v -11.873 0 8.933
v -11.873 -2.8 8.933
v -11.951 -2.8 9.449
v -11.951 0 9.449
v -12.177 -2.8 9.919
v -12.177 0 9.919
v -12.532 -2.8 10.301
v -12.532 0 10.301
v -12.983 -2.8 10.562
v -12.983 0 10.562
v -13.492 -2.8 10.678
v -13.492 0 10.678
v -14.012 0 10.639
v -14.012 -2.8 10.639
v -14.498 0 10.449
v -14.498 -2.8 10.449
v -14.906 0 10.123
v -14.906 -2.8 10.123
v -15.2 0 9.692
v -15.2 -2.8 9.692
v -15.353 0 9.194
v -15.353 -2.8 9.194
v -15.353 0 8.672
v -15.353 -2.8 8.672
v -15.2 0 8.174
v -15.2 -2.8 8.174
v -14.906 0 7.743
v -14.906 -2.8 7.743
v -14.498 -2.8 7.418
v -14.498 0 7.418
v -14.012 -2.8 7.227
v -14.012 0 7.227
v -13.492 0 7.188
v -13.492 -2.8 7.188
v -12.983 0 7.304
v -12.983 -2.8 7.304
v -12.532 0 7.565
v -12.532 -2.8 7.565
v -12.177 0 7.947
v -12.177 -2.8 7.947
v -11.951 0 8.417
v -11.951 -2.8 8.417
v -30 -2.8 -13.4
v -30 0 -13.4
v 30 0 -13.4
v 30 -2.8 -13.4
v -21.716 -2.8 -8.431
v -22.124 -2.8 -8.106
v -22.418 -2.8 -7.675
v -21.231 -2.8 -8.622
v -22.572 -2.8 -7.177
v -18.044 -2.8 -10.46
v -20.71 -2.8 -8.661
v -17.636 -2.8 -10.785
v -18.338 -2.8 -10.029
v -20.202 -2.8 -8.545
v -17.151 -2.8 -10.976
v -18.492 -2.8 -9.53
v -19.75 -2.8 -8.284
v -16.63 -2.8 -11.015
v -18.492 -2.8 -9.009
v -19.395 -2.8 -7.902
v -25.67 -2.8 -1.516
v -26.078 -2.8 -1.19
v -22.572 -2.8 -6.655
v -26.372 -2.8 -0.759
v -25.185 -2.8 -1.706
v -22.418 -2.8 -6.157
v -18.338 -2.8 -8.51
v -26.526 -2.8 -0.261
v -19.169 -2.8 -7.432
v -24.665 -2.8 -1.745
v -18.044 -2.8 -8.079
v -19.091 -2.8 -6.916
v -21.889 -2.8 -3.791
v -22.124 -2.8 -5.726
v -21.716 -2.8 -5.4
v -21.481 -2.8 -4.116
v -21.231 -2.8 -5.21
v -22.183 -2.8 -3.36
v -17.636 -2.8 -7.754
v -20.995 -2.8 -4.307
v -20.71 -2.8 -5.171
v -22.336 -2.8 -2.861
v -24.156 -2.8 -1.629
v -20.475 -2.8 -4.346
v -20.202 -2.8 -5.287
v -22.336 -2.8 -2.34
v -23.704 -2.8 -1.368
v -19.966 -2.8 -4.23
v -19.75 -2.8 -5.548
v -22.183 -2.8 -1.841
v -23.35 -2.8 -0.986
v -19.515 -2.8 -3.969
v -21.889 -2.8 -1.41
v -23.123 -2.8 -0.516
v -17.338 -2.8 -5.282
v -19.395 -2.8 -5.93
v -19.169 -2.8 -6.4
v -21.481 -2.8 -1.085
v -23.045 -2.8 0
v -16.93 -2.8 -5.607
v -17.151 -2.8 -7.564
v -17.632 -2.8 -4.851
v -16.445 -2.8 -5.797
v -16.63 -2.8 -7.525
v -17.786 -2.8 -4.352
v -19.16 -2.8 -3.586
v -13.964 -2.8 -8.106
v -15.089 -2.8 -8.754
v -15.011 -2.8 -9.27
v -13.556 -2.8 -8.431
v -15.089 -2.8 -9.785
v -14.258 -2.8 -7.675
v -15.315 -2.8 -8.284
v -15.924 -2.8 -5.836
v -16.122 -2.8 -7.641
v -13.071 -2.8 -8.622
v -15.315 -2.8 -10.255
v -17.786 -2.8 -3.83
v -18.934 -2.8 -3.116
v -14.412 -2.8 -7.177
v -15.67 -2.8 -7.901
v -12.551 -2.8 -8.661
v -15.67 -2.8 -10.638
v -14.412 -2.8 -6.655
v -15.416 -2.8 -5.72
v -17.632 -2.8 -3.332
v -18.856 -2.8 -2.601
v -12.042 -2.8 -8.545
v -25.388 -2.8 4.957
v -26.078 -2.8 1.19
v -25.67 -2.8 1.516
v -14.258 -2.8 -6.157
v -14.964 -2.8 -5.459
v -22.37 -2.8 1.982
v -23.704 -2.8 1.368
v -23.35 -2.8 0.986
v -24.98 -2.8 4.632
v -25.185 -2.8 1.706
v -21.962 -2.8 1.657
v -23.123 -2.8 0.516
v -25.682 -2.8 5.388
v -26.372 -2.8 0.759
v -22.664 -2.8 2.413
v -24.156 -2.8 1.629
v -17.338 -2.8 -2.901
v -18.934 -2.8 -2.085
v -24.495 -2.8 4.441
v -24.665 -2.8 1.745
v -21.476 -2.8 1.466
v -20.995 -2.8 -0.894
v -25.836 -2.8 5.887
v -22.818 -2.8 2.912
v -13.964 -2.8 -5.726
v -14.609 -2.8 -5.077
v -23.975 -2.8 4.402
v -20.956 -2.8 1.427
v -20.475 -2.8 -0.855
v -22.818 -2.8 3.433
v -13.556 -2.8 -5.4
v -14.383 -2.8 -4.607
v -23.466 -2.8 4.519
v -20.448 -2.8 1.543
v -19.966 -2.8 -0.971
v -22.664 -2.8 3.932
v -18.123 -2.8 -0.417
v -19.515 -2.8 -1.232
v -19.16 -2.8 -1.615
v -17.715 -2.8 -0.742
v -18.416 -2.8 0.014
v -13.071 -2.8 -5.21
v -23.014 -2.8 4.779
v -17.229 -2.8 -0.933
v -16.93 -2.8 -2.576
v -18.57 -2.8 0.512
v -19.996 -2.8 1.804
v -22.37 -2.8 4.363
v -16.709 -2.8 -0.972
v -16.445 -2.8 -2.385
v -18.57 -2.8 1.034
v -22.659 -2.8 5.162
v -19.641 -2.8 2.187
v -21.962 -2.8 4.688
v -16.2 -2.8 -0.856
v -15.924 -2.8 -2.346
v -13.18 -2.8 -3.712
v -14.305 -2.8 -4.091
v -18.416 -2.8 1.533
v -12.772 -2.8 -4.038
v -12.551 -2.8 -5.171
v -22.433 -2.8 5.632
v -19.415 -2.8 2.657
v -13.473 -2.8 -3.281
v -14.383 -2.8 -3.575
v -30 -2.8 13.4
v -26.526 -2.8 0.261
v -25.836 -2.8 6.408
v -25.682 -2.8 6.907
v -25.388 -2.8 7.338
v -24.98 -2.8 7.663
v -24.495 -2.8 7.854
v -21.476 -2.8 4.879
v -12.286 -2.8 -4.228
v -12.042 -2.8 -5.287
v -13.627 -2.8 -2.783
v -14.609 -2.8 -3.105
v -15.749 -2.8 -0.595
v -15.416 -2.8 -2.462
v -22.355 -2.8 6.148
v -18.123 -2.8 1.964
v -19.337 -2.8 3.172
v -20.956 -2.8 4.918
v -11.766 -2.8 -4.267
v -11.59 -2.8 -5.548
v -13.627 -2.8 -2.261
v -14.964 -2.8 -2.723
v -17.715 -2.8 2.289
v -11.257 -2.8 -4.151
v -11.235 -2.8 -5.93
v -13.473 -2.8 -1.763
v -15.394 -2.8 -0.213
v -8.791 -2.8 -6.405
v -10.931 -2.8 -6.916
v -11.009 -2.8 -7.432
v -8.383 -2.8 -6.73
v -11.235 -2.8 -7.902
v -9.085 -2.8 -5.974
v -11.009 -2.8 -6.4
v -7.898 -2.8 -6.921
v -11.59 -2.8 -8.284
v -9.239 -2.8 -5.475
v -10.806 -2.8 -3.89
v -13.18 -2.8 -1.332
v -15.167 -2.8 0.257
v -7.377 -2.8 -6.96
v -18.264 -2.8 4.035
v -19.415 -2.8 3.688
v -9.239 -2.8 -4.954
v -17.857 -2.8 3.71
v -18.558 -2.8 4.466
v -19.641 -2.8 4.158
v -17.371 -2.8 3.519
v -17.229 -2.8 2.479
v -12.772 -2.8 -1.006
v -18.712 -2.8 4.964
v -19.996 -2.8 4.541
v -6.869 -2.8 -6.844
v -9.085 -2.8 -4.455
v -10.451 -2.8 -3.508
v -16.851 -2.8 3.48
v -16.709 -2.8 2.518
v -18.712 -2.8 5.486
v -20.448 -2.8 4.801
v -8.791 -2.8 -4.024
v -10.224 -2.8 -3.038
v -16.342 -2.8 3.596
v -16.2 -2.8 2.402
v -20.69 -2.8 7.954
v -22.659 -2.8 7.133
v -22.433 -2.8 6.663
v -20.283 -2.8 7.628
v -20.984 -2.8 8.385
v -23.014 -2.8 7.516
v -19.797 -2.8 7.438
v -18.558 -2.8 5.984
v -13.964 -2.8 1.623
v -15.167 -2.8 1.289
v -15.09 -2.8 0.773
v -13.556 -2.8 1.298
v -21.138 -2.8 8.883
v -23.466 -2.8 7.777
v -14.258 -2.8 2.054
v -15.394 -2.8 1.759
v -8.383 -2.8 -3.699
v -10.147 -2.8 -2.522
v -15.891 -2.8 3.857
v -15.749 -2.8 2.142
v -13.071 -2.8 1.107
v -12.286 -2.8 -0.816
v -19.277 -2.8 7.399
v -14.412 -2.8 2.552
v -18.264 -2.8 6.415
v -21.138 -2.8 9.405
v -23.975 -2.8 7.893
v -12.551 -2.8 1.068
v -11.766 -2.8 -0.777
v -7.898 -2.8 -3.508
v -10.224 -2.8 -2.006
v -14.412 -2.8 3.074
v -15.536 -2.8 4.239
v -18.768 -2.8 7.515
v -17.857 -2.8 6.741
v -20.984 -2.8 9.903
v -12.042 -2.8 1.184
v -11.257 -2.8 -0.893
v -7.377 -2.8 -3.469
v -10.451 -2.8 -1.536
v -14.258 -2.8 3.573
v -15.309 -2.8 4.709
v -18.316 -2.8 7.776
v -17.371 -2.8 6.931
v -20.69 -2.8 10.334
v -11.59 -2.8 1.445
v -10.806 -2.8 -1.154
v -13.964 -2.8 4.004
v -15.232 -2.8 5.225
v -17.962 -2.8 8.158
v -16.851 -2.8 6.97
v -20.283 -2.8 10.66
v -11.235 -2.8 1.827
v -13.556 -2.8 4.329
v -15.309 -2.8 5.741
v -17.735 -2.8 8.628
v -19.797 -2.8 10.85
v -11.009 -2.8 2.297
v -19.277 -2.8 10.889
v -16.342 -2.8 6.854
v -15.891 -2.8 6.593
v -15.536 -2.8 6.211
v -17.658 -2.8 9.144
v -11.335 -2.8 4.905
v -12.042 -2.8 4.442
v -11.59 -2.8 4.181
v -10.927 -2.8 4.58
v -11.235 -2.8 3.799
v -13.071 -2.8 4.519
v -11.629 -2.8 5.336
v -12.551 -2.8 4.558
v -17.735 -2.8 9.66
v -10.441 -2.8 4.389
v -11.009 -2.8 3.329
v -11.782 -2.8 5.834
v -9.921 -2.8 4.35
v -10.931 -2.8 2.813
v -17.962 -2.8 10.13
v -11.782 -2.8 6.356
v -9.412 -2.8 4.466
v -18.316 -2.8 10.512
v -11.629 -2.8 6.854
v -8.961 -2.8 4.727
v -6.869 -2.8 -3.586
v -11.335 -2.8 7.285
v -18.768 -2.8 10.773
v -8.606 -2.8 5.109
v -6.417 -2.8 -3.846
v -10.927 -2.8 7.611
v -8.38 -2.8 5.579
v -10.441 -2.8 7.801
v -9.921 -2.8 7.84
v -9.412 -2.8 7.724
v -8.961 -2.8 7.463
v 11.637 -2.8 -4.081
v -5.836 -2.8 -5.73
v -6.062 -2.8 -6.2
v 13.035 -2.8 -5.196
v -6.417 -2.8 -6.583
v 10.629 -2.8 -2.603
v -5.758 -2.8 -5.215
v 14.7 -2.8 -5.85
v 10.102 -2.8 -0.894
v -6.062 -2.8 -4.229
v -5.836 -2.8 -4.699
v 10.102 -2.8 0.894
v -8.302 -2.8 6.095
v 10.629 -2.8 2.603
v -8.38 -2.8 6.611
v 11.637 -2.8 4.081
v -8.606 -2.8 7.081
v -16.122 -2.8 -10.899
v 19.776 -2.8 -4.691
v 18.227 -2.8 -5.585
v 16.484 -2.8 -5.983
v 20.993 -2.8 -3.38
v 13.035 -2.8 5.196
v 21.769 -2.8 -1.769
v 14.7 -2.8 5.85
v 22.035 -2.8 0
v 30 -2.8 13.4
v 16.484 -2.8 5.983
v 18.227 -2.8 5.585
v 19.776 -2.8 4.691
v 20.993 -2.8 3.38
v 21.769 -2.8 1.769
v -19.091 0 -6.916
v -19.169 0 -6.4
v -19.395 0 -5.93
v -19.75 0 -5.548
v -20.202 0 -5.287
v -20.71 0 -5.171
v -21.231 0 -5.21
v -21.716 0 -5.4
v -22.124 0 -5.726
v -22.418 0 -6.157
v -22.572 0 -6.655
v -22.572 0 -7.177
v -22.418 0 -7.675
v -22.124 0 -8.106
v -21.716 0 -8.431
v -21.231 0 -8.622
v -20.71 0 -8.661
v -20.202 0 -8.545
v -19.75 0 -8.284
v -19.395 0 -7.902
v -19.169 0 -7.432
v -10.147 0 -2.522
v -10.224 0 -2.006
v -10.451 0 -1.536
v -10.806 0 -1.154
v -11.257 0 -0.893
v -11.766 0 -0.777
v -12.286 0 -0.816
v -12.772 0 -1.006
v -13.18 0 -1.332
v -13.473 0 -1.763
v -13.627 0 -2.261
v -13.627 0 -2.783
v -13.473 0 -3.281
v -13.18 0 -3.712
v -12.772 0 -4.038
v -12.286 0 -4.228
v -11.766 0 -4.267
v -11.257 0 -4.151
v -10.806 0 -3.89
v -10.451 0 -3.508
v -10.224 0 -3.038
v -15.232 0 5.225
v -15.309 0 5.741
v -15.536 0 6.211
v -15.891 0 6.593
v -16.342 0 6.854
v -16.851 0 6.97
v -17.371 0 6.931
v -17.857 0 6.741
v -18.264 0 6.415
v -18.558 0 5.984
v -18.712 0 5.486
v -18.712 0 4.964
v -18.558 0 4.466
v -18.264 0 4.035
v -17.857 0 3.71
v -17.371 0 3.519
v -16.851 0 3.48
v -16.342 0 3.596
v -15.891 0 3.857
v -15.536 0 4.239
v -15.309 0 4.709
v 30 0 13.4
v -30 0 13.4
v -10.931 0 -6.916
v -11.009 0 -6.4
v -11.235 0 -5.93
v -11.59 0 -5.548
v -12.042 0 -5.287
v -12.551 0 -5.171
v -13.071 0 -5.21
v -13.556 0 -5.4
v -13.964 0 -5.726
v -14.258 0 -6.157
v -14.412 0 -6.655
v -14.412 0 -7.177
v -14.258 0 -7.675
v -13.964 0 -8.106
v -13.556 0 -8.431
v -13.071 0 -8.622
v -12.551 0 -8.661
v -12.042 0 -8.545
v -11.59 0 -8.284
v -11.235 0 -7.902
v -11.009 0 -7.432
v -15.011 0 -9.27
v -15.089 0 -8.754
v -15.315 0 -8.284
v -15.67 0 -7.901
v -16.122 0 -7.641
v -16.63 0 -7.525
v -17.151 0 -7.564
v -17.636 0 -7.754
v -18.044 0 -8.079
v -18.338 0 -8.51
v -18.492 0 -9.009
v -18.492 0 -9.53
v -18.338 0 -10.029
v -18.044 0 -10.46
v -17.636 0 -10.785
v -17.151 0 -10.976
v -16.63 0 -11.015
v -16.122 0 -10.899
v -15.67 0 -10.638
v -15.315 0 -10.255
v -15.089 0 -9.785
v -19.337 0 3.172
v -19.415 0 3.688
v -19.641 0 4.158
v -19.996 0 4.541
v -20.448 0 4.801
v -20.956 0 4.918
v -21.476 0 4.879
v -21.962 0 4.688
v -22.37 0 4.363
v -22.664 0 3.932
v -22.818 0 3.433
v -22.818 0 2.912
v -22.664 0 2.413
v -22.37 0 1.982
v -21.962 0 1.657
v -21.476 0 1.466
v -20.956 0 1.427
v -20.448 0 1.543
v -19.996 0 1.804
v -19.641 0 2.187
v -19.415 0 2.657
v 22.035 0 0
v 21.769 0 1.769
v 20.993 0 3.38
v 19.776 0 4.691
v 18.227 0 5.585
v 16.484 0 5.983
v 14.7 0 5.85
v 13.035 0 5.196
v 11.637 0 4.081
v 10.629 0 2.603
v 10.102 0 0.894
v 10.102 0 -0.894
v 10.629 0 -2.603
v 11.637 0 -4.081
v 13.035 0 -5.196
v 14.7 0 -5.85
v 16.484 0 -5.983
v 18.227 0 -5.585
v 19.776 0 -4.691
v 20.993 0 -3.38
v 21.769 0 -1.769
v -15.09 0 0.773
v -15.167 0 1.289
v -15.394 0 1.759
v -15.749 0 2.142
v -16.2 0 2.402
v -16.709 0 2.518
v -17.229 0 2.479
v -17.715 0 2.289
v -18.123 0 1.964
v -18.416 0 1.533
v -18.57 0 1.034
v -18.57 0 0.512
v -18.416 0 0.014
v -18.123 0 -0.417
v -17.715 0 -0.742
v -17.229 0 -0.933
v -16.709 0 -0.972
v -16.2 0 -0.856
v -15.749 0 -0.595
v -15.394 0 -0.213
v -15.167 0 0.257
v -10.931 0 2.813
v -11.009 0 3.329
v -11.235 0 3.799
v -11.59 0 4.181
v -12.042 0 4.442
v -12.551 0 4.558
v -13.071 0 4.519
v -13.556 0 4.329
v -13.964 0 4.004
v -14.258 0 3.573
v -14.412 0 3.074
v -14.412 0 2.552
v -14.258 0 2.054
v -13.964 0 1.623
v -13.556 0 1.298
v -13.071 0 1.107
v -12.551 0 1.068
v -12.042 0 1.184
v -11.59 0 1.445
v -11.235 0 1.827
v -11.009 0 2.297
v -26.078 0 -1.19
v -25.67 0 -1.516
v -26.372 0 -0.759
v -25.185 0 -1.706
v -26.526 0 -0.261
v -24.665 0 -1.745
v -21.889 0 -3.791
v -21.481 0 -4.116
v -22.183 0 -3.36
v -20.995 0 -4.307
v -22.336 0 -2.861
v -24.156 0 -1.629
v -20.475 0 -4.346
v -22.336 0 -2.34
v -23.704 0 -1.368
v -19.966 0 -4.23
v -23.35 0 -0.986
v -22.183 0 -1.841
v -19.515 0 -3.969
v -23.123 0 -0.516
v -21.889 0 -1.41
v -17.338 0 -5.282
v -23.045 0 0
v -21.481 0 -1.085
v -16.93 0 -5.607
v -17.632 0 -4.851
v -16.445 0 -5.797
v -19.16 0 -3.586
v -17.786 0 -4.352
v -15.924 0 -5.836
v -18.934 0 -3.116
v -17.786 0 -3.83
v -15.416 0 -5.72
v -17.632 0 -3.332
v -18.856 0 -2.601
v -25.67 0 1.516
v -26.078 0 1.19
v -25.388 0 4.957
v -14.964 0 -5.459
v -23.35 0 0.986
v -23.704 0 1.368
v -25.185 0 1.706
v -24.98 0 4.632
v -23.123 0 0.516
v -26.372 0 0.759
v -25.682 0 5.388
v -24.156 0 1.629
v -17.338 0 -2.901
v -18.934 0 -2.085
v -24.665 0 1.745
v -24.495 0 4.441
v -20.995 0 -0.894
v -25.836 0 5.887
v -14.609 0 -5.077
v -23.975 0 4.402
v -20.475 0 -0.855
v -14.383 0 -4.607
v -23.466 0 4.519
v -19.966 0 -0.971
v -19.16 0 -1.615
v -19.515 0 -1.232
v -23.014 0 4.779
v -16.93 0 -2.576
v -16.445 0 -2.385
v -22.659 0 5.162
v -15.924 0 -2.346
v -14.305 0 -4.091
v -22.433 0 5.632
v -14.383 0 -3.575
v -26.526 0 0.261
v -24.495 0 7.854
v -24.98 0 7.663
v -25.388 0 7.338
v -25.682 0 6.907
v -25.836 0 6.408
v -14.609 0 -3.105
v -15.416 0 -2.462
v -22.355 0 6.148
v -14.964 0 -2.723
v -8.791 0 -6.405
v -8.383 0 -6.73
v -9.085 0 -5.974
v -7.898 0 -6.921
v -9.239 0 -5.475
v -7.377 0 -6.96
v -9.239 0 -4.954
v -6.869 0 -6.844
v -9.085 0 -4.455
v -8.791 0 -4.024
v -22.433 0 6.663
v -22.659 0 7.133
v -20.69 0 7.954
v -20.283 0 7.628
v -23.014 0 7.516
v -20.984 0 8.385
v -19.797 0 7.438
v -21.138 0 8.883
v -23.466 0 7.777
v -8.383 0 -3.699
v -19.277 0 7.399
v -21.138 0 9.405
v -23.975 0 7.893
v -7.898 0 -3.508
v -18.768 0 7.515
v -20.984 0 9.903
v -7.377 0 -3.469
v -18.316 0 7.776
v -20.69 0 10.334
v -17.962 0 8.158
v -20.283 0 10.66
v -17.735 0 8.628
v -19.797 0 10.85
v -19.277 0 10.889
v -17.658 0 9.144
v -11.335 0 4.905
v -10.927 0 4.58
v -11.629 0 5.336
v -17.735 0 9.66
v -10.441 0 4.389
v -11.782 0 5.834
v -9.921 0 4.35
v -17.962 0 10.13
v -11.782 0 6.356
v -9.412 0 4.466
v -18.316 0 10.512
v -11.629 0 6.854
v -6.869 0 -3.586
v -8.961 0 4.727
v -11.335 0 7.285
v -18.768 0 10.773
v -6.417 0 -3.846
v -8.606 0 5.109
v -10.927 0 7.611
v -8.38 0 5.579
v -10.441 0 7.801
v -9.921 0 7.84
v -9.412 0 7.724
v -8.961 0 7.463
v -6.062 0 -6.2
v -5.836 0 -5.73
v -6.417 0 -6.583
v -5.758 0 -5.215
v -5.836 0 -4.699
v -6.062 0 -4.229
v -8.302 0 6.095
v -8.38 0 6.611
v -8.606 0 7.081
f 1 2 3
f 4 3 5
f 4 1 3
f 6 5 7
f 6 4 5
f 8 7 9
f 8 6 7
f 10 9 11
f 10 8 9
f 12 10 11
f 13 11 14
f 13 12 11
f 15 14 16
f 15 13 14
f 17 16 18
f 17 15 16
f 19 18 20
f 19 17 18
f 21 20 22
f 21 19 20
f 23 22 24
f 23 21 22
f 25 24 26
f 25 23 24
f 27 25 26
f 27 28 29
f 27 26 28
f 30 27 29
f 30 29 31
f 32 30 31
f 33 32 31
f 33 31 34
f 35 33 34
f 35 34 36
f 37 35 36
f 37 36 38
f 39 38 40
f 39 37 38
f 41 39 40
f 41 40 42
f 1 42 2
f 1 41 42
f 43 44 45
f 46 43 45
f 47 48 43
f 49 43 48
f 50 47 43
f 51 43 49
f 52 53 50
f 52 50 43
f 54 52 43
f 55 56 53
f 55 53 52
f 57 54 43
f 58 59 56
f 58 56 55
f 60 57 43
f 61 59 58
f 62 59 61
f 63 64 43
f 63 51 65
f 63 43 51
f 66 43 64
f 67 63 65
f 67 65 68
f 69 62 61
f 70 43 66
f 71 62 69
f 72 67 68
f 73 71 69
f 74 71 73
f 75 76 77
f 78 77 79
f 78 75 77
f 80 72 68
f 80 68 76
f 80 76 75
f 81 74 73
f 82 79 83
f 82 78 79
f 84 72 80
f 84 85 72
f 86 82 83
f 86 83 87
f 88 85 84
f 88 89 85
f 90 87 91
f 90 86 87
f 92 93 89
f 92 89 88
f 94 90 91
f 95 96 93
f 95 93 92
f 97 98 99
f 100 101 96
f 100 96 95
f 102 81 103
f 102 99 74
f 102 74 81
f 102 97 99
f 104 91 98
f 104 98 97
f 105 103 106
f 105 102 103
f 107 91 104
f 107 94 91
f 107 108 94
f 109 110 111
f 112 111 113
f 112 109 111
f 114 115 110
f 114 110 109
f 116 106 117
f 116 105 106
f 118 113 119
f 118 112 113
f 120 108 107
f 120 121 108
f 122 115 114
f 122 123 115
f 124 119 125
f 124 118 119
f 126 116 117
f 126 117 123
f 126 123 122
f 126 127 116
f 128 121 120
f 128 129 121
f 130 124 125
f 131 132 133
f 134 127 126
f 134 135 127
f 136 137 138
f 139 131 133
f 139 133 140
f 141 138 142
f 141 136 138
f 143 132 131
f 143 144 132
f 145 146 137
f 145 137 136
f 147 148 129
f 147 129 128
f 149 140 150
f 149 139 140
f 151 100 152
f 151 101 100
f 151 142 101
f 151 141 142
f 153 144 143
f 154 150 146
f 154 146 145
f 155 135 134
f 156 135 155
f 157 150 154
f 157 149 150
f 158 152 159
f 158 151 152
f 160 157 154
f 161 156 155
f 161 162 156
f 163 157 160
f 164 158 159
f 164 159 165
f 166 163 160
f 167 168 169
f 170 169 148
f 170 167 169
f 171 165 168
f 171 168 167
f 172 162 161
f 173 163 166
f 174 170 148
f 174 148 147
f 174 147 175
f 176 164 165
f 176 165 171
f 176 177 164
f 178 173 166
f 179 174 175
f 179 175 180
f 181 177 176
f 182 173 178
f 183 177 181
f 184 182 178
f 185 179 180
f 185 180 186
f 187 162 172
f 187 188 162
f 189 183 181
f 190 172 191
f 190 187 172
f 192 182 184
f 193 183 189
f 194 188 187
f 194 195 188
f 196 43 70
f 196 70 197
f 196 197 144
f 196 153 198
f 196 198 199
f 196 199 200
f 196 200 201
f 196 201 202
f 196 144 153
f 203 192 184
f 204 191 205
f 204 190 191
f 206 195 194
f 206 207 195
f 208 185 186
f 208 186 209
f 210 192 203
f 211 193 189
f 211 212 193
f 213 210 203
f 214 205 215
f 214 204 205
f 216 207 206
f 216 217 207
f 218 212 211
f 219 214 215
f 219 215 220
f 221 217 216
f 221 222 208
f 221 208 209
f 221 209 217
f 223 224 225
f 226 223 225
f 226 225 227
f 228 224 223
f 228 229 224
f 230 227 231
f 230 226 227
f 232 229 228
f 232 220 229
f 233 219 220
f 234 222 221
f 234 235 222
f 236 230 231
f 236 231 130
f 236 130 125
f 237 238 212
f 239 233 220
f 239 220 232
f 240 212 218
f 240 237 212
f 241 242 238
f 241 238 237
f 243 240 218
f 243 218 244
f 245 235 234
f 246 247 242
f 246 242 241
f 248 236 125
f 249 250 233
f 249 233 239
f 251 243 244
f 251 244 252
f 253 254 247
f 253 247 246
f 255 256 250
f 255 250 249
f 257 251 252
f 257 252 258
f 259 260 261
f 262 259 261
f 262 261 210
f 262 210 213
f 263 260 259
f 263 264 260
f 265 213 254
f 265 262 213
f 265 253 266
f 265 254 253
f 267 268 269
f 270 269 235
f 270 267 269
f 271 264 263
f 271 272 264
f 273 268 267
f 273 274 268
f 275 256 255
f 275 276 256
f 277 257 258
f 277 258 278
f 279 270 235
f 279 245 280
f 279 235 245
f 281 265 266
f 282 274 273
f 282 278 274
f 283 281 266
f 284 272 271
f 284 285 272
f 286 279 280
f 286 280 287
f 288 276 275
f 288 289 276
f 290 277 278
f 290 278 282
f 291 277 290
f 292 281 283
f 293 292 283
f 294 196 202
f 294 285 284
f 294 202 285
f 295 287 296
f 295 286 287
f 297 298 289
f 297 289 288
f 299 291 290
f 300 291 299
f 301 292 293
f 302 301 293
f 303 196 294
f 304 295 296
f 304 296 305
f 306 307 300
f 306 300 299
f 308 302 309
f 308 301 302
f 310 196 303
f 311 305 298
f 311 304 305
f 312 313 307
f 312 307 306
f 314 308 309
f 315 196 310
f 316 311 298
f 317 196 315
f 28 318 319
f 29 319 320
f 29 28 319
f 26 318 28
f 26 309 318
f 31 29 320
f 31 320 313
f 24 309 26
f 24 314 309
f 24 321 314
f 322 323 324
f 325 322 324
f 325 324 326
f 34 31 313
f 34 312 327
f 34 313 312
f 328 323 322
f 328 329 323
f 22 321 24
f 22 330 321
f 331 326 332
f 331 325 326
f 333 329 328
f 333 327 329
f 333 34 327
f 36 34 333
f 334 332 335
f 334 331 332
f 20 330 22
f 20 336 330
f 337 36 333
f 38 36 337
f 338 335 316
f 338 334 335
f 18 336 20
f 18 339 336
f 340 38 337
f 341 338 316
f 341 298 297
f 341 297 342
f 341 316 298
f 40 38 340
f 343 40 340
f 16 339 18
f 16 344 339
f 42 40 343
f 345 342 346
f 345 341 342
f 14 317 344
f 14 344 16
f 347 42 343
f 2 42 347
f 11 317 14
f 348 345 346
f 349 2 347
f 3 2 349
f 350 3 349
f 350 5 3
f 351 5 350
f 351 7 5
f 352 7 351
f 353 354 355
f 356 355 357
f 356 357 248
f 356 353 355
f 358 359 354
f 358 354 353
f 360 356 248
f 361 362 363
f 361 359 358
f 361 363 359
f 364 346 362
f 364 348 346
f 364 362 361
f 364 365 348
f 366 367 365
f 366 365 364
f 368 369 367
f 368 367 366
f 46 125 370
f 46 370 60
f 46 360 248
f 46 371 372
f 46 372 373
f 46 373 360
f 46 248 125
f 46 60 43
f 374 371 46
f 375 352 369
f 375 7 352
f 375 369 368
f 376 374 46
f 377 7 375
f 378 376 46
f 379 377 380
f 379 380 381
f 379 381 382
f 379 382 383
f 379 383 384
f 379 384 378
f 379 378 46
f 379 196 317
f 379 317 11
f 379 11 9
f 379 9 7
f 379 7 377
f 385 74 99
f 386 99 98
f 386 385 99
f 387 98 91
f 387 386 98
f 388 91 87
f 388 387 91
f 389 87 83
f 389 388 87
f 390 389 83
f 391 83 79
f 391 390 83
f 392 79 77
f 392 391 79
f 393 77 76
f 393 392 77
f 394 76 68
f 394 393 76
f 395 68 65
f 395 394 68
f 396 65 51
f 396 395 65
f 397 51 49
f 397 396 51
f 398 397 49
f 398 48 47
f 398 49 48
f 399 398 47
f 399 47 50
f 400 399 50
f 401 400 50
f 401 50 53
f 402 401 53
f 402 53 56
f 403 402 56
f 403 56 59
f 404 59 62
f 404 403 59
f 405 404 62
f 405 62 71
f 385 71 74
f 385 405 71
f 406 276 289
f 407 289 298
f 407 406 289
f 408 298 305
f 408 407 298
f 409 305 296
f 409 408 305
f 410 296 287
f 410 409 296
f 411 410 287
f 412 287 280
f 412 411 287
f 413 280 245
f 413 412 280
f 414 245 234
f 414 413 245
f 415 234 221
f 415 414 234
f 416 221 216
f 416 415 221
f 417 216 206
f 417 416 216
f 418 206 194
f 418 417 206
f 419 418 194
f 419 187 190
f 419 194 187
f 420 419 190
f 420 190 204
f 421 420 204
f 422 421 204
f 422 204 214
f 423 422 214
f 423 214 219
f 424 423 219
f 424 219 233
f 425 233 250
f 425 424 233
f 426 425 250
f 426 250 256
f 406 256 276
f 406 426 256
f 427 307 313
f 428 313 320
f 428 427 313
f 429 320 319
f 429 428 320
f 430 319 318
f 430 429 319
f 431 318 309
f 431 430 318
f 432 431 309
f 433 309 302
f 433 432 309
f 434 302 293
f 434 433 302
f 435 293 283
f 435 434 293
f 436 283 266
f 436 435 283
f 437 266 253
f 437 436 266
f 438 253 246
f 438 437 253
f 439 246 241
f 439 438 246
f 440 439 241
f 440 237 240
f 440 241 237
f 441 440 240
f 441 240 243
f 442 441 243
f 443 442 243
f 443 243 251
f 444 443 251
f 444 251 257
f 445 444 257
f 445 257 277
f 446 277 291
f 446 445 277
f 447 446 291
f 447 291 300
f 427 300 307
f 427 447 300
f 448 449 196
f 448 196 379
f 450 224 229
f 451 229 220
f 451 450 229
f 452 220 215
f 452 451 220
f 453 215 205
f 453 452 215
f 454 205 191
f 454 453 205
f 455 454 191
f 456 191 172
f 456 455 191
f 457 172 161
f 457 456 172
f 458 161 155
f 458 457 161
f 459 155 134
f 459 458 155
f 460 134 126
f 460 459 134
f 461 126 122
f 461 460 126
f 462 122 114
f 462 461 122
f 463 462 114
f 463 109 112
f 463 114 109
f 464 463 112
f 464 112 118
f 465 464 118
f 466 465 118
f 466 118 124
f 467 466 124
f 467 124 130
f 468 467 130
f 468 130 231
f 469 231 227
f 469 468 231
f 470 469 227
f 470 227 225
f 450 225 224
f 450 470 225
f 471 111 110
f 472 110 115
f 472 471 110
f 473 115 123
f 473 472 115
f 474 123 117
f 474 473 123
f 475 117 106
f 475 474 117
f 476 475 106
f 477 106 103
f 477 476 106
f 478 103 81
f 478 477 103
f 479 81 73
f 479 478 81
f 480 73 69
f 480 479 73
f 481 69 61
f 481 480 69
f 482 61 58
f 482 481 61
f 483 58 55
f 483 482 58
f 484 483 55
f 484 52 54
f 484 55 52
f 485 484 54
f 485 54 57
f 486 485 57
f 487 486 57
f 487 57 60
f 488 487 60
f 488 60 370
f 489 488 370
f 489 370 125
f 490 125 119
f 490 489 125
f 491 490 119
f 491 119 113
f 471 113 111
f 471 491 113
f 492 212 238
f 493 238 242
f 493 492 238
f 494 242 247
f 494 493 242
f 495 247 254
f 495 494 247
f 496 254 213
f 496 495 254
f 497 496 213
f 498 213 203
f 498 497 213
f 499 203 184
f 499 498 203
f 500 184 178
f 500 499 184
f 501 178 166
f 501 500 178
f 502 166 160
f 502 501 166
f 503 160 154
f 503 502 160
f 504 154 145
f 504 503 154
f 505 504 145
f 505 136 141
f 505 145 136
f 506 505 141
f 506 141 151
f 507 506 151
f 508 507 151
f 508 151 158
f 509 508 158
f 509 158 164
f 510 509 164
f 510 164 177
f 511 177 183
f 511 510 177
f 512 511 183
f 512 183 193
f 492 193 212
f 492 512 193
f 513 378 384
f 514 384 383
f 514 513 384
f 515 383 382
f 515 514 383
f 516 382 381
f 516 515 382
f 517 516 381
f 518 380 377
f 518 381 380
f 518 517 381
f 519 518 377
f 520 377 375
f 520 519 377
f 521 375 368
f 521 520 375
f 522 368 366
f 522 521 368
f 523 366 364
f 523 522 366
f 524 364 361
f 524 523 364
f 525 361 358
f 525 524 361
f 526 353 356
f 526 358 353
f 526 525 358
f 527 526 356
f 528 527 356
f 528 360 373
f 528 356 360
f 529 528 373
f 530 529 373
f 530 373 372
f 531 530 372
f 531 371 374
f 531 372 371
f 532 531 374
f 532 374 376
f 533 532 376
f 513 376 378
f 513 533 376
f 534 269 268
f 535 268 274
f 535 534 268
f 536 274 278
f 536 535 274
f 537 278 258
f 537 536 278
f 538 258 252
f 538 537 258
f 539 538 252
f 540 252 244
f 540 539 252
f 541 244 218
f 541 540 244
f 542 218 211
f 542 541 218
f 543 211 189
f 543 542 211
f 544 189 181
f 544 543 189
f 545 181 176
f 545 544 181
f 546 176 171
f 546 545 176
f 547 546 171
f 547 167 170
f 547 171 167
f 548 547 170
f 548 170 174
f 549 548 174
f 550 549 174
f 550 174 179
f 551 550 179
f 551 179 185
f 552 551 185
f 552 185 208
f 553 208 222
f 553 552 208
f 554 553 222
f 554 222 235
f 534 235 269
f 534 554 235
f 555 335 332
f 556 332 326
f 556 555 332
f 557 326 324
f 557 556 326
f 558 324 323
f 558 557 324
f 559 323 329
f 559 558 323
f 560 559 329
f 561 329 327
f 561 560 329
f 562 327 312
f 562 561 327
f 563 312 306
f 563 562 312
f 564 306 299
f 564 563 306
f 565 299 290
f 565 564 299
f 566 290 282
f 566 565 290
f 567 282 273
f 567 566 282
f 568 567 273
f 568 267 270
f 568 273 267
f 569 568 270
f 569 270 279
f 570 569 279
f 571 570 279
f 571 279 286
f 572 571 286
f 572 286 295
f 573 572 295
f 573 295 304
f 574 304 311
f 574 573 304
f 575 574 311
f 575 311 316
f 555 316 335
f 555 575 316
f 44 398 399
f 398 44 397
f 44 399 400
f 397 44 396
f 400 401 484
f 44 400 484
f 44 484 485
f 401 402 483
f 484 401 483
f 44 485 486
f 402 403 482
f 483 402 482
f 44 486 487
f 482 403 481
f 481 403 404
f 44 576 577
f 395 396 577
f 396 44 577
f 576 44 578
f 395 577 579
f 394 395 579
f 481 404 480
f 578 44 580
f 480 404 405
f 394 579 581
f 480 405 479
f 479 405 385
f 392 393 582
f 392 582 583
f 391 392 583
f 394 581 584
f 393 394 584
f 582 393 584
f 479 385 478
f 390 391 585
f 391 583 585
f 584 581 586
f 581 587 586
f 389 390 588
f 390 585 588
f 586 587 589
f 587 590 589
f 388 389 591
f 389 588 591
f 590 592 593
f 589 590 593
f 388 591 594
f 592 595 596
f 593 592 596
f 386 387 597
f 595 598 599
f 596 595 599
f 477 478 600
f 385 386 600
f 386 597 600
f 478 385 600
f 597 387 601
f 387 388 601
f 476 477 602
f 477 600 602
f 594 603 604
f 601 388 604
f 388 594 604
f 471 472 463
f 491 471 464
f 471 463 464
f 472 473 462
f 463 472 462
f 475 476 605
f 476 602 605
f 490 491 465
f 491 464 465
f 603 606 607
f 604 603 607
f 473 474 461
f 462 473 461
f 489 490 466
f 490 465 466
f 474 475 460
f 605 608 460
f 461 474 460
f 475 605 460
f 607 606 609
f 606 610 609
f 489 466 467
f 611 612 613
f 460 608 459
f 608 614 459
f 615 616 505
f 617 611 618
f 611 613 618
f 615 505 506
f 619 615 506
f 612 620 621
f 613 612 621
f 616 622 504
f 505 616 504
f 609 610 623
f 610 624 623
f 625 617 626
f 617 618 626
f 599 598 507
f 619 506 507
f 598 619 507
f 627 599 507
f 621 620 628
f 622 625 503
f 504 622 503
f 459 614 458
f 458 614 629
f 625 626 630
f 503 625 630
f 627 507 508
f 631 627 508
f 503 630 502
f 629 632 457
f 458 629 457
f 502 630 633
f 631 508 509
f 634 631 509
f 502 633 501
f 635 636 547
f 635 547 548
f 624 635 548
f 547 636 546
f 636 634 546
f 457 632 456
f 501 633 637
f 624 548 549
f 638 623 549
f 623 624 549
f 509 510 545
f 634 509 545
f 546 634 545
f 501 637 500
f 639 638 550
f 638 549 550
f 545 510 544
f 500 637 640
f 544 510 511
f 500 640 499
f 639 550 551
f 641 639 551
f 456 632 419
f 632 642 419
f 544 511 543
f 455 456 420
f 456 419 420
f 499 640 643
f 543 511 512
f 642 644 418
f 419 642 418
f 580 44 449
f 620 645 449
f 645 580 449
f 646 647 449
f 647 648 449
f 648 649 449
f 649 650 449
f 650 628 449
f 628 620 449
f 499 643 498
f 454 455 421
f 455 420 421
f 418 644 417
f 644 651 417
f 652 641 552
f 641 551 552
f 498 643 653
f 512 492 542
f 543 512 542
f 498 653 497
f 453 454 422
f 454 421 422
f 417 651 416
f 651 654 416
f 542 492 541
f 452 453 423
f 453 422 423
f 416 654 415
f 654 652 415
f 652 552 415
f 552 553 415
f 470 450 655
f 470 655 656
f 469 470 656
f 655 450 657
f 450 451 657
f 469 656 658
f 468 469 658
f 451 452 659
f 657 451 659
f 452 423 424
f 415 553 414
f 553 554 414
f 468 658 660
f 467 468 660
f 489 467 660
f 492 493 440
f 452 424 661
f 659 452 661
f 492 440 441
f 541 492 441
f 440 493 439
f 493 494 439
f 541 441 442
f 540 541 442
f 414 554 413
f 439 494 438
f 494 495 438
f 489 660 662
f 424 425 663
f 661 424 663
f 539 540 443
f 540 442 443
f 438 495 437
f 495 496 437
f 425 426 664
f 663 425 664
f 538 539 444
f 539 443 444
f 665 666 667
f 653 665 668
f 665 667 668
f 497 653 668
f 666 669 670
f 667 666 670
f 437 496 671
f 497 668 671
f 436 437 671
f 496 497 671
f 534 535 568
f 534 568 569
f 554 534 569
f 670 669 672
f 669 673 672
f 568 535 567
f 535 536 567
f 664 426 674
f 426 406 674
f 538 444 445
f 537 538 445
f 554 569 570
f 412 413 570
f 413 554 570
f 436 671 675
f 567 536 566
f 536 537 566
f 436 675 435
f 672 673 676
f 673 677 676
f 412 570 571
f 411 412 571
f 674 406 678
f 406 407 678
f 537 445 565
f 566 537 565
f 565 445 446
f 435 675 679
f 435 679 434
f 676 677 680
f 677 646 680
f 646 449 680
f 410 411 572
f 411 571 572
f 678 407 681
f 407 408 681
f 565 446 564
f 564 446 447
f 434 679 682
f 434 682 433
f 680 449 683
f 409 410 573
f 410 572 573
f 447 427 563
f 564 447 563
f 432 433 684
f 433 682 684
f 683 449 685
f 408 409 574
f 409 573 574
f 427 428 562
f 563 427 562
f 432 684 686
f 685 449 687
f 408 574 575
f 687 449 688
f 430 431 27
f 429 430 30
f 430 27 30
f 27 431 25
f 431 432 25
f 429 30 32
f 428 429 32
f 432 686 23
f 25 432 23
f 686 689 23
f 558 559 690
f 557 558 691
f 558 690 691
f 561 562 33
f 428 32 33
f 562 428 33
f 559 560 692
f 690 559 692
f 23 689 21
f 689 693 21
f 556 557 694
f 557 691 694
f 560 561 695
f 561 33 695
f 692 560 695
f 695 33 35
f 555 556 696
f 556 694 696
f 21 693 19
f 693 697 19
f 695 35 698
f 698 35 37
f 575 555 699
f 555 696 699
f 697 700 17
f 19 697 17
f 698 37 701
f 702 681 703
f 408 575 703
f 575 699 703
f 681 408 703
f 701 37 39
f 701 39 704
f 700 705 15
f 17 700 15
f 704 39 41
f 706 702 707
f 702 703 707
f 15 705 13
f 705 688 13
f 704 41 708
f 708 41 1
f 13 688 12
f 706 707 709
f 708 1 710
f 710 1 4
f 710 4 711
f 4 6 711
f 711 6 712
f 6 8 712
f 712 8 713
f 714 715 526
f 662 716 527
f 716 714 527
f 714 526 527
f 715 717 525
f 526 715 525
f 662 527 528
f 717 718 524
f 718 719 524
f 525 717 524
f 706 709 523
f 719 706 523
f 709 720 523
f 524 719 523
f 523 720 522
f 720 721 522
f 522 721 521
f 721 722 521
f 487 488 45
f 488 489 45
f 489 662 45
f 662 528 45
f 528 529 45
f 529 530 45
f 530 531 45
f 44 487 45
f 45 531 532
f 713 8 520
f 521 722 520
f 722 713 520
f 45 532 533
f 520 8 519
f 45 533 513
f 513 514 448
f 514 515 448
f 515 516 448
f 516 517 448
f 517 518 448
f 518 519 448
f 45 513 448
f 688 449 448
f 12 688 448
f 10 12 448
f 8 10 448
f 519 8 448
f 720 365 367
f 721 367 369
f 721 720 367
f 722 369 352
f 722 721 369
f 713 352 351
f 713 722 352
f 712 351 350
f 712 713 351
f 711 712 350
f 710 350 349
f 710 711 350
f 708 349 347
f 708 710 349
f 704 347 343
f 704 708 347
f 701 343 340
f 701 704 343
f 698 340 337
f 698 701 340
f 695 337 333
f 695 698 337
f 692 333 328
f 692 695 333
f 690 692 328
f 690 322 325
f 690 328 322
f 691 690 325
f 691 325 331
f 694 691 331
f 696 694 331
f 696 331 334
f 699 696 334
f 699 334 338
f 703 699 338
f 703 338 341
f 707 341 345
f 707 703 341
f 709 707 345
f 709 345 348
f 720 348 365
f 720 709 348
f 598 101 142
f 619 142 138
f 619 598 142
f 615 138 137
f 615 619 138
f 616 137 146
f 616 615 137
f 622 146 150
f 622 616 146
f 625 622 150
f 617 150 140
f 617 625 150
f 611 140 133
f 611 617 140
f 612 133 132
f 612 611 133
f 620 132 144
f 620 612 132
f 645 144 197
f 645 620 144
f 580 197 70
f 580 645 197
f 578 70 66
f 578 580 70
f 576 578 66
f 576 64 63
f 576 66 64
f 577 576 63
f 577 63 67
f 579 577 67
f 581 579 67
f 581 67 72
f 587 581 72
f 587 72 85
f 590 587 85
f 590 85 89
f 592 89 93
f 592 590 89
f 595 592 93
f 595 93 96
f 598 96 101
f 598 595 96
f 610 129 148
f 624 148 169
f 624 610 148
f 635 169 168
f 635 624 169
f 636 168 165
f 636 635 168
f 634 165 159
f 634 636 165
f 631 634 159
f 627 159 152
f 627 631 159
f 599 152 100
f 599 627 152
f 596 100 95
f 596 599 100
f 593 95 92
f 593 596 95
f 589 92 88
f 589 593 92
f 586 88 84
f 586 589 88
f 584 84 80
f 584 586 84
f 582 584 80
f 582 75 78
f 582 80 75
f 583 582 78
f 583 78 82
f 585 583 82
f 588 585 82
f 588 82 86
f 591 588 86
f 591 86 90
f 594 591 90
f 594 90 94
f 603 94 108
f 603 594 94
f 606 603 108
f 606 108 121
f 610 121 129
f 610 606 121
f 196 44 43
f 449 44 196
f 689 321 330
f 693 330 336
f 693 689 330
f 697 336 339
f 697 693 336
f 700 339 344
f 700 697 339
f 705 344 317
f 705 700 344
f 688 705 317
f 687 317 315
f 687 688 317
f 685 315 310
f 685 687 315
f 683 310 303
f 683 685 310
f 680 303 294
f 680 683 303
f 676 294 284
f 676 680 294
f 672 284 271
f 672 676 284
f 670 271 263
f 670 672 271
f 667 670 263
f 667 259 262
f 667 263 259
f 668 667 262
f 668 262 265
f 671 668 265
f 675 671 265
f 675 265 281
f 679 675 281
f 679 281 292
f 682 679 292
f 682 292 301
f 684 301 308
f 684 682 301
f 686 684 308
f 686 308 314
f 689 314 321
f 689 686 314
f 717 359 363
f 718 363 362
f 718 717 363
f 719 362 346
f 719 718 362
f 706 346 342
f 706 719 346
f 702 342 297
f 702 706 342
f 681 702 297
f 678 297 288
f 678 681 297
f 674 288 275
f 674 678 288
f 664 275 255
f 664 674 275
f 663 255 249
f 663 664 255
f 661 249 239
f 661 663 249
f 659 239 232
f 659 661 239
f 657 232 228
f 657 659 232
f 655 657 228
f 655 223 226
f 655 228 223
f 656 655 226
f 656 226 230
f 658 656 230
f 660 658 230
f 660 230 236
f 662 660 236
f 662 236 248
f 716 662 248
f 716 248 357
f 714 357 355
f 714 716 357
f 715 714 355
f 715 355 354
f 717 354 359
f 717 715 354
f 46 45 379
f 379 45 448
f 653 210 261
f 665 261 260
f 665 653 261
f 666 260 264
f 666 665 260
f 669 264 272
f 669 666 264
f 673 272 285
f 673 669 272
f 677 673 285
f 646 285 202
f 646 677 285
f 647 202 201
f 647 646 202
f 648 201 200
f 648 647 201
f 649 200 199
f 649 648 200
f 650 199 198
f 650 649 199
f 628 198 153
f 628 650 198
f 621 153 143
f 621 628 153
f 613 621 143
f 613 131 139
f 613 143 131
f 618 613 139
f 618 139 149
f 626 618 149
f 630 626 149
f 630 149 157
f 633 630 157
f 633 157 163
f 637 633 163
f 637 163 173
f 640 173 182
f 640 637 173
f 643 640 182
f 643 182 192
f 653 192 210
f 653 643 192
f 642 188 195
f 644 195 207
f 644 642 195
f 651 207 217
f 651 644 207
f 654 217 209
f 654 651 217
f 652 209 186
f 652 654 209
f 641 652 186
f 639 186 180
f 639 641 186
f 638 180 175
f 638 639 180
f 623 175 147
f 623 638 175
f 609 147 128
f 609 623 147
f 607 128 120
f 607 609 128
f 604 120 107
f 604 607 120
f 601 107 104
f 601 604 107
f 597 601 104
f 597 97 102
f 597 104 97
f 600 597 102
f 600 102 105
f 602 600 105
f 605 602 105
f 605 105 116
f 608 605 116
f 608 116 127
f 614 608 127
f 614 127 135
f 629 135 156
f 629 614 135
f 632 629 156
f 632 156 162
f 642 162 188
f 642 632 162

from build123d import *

# Parameters (mm, degrees)
F0_W          = 60
F0_H          = 26.8
F1_DEPTH      = 2.8
F2_R          = 1.75
F2_R_2        = 6
F3_DEPTH      = 25
F3_DEPTH_BACK = 25


with BuildPart() as f1:
    # F0 (on Front) → F1 (new body)
    with BuildSketch(Plane.XZ):
        Rectangle(F0_W, F0_H)
    extrude(amount=F1_DEPTH)

    # F2 (on Front) → F3 (cut, two sides)
    with BuildSketch(Plane.XZ) as f3_sk:
        with Locations((-19.407583, 9.143958)):
            Circle(F2_R)
        with Locations((-21.087086, 3.172394)):
            Circle(F2_R)
        with Locations((-16.981635, 5.225119)):
            Circle(F2_R)
        with Locations((-16.839717, 0.773296)):
            Circle(F2_R)
        with Locations((-20.605817, -2.600502)):
            Circle(F2_R)
        with Locations((-16.055113, -4.09125)):
            Circle(F2_R)
        with Locations((-13.622839, 8.93318)):
            Circle(F2_R)
        with Locations((-12.681315, 2.813267)):
            Circle(F2_R)
        with Locations((-11.89671, -2.522042)):
            Circle(F2_R)
        with Locations((-12.681315, -6.915826)):
            Circle(F2_R)
        with Locations((-20.841198, -6.915826)):
            Circle(F2_R)
        with Locations((-16.761256, -9.269638)):
            Circle(F2_R)
        with Locations((16.035197, 0)):
            Circle(F2_R_2)
        with Locations((-10.051827, 6.095069)):
            Circle(F2_R)
        with Locations((-24.795463, 0)):
            Circle(F2_R)
        with Locations((-24.105322, 6.147532)):
            Circle(F2_R)
        with Locations((-7.508276, -5.214532)):
            Circle(F2_R)
    extrude(amount=F3_DEPTH, mode=Mode.SUBTRACT)
    extrude(f3_sk.sketch, amount=-F3_DEPTH_BACK, mode=Mode.SUBTRACT)


solid = f1.part
